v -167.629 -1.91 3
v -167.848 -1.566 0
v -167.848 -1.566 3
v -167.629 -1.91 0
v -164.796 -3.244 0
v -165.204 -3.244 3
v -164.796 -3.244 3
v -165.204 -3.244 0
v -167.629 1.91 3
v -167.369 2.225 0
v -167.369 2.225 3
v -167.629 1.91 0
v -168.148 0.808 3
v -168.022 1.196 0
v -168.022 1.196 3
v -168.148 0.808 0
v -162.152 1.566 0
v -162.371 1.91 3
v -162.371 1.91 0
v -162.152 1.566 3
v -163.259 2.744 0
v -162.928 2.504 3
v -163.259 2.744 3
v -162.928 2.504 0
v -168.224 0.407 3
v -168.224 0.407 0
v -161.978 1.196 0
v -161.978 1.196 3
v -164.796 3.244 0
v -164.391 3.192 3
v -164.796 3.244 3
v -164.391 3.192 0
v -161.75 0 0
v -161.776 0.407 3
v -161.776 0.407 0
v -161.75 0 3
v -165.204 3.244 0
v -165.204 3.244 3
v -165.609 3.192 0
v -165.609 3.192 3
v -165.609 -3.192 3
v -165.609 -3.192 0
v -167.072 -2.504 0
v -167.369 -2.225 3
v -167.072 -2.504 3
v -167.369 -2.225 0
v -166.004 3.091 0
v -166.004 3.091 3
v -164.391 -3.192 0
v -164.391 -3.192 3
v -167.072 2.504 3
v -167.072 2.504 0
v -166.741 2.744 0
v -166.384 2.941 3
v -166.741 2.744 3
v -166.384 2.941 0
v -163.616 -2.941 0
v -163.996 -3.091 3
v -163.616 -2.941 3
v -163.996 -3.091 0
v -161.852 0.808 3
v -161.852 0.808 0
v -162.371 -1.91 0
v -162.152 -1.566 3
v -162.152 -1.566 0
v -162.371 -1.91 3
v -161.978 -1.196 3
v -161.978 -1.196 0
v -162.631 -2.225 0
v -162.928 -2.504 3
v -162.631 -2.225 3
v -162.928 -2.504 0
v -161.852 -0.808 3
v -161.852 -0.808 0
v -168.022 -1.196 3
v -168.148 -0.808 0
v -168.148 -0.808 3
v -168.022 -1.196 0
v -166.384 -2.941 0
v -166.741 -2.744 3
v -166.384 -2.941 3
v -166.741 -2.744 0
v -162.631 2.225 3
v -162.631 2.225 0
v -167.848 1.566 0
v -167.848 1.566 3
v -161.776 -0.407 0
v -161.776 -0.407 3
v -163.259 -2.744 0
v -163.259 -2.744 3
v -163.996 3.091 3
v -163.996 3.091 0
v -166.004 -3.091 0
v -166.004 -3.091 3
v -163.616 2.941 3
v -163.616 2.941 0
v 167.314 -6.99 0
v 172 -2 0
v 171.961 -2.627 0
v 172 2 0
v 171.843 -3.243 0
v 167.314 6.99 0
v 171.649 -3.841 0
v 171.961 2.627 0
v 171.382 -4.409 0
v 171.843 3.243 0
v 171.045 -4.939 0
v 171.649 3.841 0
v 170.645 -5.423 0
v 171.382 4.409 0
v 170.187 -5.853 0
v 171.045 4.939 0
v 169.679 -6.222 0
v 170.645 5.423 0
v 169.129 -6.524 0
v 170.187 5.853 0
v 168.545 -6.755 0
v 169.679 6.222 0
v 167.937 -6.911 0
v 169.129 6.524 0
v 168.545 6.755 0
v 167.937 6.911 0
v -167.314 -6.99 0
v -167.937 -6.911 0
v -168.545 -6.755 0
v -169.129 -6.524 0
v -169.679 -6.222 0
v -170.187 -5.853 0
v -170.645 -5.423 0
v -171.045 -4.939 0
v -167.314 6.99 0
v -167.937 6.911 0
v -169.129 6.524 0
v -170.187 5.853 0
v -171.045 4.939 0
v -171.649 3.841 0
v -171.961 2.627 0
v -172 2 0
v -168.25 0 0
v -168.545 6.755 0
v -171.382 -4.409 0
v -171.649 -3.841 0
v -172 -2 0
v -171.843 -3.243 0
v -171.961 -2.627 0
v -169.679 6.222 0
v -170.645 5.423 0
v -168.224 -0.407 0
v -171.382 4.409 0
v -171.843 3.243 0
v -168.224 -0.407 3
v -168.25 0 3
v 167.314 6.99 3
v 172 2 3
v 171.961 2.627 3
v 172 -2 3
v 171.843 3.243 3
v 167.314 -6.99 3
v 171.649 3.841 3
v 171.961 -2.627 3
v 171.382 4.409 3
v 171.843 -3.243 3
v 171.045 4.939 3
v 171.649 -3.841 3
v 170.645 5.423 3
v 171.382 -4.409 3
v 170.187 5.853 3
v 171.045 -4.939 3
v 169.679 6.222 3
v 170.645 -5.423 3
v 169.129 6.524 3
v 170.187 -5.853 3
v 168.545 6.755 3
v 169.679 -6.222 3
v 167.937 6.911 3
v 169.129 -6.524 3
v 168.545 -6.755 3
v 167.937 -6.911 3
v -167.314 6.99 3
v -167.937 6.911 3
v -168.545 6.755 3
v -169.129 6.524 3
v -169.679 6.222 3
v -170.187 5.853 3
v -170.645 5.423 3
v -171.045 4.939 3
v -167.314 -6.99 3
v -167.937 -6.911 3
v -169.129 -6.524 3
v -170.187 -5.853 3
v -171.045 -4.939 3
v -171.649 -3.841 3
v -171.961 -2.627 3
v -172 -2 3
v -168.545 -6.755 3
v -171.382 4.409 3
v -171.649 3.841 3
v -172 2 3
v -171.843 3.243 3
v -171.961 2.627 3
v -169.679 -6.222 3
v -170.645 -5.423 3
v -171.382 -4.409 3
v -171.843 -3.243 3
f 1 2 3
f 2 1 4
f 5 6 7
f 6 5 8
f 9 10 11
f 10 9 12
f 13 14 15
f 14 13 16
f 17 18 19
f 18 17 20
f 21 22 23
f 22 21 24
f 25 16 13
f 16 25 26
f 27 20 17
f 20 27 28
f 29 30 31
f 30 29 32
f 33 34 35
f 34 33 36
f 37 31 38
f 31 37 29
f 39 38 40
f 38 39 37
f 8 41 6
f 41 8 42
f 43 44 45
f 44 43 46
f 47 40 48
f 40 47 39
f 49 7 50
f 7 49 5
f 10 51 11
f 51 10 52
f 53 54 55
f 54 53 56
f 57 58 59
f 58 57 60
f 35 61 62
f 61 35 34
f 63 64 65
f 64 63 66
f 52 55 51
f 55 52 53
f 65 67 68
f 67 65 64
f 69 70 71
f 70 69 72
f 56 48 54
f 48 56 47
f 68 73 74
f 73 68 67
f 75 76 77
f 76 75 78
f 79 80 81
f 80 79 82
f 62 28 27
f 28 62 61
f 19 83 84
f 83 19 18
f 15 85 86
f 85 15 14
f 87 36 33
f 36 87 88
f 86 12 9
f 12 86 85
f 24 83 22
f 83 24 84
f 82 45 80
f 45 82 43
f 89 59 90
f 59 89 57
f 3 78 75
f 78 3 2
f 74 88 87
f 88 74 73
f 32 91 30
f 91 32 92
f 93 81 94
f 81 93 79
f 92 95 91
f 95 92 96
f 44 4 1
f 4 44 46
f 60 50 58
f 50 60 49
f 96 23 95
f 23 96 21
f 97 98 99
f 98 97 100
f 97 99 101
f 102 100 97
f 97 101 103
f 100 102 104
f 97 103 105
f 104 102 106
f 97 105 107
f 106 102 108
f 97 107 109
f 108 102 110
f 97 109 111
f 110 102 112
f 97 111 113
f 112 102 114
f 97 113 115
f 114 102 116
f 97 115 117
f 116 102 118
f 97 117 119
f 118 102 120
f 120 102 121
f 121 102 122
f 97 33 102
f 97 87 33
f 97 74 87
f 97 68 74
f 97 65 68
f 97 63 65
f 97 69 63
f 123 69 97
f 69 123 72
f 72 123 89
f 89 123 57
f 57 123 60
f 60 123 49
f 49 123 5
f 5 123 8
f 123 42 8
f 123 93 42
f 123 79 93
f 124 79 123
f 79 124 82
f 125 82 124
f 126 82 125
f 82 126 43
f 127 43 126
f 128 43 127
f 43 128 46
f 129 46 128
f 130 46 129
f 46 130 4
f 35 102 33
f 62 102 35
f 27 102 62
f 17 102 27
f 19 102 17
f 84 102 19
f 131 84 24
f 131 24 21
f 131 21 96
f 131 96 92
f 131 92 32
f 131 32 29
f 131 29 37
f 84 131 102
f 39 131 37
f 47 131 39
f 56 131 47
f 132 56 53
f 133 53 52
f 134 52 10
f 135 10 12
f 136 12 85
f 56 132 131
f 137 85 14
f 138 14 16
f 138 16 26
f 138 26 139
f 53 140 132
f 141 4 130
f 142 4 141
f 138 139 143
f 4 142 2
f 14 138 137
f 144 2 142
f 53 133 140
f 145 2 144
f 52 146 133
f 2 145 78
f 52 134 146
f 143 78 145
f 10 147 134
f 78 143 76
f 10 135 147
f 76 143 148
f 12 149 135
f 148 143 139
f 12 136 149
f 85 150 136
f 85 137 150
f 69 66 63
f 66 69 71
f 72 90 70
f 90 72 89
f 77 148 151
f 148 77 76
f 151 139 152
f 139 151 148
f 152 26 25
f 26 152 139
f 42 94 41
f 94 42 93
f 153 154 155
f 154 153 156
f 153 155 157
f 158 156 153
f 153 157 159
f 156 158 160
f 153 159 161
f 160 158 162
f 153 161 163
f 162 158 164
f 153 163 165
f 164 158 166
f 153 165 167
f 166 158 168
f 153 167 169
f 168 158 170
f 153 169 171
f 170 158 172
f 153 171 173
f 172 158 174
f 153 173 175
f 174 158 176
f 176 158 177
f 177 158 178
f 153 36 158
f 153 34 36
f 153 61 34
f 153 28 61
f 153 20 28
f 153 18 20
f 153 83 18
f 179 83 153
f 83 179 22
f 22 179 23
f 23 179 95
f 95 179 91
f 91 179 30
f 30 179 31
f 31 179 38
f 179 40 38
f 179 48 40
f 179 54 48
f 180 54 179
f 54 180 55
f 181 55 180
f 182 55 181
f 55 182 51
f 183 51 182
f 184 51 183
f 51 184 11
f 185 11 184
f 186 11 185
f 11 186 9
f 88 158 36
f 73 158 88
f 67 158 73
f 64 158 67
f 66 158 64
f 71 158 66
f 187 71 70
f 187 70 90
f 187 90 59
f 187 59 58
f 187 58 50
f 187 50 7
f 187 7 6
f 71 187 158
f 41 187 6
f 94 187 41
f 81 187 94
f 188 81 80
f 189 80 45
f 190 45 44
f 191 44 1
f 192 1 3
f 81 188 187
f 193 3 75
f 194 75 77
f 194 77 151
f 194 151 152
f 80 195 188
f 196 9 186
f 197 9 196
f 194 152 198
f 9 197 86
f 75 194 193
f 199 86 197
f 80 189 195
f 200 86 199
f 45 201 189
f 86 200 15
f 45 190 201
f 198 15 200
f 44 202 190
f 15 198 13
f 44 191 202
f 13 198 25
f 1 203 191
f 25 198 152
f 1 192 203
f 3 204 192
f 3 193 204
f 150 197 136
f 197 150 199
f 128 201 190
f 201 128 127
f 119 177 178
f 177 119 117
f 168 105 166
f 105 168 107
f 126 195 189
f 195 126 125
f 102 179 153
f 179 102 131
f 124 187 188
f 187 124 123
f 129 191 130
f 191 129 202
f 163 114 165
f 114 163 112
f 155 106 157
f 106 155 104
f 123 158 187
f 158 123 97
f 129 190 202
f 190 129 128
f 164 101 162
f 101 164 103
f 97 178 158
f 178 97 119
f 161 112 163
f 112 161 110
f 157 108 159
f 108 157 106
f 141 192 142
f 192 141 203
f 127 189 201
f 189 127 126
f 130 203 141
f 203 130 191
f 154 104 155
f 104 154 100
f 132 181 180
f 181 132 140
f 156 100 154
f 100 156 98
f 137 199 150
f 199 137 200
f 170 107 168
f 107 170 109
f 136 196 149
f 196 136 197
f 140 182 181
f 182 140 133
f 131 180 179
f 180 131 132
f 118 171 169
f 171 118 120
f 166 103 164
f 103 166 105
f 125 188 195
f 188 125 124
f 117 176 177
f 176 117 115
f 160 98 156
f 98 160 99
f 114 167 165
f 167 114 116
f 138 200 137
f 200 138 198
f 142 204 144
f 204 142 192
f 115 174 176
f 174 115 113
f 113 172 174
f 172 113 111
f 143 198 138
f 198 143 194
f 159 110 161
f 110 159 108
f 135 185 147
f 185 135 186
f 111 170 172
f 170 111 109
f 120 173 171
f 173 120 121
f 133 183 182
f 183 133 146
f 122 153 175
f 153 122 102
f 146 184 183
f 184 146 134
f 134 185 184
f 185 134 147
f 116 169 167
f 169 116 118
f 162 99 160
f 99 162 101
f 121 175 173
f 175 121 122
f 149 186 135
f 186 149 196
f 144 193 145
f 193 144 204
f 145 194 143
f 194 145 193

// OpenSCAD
$fn = 50;


difference() {
	union() {
		hull() {
			translate(v = [-167.0000000000, 2.0000000000, 0]) {
				cylinder(h = 3, r = 5);
			}
			translate(v = [167.0000000000, 2.0000000000, 0]) {
				cylinder(h = 3, r = 5);
			}
			translate(v = [-167.0000000000, -2.0000000000, 0]) {
				cylinder(h = 3, r = 5);
			}
			translate(v = [167.0000000000, -2.0000000000, 0]) {
				cylinder(h = 3, r = 5);
			}
		}
	}
	union() {
		translate(v = [-165.0000000000, 0.0000000000, 0]) {
			cylinder(h = 3, r = 3.2500000000);
		}
		translate(v = [-165.0000000000, 0.0000000000, 0]) {
			cylinder(h = 3, r = 1.8000000000);
		}
		translate(v = [-165.0000000000, 0.0000000000, 0]) {
			cylinder(h = 3, r = 1.8000000000);
		}
		translate(v = [-165.0000000000, 0.0000000000, 0]) {
			cylinder(h = 3, r = 1.8000000000);
		}
	}
}
